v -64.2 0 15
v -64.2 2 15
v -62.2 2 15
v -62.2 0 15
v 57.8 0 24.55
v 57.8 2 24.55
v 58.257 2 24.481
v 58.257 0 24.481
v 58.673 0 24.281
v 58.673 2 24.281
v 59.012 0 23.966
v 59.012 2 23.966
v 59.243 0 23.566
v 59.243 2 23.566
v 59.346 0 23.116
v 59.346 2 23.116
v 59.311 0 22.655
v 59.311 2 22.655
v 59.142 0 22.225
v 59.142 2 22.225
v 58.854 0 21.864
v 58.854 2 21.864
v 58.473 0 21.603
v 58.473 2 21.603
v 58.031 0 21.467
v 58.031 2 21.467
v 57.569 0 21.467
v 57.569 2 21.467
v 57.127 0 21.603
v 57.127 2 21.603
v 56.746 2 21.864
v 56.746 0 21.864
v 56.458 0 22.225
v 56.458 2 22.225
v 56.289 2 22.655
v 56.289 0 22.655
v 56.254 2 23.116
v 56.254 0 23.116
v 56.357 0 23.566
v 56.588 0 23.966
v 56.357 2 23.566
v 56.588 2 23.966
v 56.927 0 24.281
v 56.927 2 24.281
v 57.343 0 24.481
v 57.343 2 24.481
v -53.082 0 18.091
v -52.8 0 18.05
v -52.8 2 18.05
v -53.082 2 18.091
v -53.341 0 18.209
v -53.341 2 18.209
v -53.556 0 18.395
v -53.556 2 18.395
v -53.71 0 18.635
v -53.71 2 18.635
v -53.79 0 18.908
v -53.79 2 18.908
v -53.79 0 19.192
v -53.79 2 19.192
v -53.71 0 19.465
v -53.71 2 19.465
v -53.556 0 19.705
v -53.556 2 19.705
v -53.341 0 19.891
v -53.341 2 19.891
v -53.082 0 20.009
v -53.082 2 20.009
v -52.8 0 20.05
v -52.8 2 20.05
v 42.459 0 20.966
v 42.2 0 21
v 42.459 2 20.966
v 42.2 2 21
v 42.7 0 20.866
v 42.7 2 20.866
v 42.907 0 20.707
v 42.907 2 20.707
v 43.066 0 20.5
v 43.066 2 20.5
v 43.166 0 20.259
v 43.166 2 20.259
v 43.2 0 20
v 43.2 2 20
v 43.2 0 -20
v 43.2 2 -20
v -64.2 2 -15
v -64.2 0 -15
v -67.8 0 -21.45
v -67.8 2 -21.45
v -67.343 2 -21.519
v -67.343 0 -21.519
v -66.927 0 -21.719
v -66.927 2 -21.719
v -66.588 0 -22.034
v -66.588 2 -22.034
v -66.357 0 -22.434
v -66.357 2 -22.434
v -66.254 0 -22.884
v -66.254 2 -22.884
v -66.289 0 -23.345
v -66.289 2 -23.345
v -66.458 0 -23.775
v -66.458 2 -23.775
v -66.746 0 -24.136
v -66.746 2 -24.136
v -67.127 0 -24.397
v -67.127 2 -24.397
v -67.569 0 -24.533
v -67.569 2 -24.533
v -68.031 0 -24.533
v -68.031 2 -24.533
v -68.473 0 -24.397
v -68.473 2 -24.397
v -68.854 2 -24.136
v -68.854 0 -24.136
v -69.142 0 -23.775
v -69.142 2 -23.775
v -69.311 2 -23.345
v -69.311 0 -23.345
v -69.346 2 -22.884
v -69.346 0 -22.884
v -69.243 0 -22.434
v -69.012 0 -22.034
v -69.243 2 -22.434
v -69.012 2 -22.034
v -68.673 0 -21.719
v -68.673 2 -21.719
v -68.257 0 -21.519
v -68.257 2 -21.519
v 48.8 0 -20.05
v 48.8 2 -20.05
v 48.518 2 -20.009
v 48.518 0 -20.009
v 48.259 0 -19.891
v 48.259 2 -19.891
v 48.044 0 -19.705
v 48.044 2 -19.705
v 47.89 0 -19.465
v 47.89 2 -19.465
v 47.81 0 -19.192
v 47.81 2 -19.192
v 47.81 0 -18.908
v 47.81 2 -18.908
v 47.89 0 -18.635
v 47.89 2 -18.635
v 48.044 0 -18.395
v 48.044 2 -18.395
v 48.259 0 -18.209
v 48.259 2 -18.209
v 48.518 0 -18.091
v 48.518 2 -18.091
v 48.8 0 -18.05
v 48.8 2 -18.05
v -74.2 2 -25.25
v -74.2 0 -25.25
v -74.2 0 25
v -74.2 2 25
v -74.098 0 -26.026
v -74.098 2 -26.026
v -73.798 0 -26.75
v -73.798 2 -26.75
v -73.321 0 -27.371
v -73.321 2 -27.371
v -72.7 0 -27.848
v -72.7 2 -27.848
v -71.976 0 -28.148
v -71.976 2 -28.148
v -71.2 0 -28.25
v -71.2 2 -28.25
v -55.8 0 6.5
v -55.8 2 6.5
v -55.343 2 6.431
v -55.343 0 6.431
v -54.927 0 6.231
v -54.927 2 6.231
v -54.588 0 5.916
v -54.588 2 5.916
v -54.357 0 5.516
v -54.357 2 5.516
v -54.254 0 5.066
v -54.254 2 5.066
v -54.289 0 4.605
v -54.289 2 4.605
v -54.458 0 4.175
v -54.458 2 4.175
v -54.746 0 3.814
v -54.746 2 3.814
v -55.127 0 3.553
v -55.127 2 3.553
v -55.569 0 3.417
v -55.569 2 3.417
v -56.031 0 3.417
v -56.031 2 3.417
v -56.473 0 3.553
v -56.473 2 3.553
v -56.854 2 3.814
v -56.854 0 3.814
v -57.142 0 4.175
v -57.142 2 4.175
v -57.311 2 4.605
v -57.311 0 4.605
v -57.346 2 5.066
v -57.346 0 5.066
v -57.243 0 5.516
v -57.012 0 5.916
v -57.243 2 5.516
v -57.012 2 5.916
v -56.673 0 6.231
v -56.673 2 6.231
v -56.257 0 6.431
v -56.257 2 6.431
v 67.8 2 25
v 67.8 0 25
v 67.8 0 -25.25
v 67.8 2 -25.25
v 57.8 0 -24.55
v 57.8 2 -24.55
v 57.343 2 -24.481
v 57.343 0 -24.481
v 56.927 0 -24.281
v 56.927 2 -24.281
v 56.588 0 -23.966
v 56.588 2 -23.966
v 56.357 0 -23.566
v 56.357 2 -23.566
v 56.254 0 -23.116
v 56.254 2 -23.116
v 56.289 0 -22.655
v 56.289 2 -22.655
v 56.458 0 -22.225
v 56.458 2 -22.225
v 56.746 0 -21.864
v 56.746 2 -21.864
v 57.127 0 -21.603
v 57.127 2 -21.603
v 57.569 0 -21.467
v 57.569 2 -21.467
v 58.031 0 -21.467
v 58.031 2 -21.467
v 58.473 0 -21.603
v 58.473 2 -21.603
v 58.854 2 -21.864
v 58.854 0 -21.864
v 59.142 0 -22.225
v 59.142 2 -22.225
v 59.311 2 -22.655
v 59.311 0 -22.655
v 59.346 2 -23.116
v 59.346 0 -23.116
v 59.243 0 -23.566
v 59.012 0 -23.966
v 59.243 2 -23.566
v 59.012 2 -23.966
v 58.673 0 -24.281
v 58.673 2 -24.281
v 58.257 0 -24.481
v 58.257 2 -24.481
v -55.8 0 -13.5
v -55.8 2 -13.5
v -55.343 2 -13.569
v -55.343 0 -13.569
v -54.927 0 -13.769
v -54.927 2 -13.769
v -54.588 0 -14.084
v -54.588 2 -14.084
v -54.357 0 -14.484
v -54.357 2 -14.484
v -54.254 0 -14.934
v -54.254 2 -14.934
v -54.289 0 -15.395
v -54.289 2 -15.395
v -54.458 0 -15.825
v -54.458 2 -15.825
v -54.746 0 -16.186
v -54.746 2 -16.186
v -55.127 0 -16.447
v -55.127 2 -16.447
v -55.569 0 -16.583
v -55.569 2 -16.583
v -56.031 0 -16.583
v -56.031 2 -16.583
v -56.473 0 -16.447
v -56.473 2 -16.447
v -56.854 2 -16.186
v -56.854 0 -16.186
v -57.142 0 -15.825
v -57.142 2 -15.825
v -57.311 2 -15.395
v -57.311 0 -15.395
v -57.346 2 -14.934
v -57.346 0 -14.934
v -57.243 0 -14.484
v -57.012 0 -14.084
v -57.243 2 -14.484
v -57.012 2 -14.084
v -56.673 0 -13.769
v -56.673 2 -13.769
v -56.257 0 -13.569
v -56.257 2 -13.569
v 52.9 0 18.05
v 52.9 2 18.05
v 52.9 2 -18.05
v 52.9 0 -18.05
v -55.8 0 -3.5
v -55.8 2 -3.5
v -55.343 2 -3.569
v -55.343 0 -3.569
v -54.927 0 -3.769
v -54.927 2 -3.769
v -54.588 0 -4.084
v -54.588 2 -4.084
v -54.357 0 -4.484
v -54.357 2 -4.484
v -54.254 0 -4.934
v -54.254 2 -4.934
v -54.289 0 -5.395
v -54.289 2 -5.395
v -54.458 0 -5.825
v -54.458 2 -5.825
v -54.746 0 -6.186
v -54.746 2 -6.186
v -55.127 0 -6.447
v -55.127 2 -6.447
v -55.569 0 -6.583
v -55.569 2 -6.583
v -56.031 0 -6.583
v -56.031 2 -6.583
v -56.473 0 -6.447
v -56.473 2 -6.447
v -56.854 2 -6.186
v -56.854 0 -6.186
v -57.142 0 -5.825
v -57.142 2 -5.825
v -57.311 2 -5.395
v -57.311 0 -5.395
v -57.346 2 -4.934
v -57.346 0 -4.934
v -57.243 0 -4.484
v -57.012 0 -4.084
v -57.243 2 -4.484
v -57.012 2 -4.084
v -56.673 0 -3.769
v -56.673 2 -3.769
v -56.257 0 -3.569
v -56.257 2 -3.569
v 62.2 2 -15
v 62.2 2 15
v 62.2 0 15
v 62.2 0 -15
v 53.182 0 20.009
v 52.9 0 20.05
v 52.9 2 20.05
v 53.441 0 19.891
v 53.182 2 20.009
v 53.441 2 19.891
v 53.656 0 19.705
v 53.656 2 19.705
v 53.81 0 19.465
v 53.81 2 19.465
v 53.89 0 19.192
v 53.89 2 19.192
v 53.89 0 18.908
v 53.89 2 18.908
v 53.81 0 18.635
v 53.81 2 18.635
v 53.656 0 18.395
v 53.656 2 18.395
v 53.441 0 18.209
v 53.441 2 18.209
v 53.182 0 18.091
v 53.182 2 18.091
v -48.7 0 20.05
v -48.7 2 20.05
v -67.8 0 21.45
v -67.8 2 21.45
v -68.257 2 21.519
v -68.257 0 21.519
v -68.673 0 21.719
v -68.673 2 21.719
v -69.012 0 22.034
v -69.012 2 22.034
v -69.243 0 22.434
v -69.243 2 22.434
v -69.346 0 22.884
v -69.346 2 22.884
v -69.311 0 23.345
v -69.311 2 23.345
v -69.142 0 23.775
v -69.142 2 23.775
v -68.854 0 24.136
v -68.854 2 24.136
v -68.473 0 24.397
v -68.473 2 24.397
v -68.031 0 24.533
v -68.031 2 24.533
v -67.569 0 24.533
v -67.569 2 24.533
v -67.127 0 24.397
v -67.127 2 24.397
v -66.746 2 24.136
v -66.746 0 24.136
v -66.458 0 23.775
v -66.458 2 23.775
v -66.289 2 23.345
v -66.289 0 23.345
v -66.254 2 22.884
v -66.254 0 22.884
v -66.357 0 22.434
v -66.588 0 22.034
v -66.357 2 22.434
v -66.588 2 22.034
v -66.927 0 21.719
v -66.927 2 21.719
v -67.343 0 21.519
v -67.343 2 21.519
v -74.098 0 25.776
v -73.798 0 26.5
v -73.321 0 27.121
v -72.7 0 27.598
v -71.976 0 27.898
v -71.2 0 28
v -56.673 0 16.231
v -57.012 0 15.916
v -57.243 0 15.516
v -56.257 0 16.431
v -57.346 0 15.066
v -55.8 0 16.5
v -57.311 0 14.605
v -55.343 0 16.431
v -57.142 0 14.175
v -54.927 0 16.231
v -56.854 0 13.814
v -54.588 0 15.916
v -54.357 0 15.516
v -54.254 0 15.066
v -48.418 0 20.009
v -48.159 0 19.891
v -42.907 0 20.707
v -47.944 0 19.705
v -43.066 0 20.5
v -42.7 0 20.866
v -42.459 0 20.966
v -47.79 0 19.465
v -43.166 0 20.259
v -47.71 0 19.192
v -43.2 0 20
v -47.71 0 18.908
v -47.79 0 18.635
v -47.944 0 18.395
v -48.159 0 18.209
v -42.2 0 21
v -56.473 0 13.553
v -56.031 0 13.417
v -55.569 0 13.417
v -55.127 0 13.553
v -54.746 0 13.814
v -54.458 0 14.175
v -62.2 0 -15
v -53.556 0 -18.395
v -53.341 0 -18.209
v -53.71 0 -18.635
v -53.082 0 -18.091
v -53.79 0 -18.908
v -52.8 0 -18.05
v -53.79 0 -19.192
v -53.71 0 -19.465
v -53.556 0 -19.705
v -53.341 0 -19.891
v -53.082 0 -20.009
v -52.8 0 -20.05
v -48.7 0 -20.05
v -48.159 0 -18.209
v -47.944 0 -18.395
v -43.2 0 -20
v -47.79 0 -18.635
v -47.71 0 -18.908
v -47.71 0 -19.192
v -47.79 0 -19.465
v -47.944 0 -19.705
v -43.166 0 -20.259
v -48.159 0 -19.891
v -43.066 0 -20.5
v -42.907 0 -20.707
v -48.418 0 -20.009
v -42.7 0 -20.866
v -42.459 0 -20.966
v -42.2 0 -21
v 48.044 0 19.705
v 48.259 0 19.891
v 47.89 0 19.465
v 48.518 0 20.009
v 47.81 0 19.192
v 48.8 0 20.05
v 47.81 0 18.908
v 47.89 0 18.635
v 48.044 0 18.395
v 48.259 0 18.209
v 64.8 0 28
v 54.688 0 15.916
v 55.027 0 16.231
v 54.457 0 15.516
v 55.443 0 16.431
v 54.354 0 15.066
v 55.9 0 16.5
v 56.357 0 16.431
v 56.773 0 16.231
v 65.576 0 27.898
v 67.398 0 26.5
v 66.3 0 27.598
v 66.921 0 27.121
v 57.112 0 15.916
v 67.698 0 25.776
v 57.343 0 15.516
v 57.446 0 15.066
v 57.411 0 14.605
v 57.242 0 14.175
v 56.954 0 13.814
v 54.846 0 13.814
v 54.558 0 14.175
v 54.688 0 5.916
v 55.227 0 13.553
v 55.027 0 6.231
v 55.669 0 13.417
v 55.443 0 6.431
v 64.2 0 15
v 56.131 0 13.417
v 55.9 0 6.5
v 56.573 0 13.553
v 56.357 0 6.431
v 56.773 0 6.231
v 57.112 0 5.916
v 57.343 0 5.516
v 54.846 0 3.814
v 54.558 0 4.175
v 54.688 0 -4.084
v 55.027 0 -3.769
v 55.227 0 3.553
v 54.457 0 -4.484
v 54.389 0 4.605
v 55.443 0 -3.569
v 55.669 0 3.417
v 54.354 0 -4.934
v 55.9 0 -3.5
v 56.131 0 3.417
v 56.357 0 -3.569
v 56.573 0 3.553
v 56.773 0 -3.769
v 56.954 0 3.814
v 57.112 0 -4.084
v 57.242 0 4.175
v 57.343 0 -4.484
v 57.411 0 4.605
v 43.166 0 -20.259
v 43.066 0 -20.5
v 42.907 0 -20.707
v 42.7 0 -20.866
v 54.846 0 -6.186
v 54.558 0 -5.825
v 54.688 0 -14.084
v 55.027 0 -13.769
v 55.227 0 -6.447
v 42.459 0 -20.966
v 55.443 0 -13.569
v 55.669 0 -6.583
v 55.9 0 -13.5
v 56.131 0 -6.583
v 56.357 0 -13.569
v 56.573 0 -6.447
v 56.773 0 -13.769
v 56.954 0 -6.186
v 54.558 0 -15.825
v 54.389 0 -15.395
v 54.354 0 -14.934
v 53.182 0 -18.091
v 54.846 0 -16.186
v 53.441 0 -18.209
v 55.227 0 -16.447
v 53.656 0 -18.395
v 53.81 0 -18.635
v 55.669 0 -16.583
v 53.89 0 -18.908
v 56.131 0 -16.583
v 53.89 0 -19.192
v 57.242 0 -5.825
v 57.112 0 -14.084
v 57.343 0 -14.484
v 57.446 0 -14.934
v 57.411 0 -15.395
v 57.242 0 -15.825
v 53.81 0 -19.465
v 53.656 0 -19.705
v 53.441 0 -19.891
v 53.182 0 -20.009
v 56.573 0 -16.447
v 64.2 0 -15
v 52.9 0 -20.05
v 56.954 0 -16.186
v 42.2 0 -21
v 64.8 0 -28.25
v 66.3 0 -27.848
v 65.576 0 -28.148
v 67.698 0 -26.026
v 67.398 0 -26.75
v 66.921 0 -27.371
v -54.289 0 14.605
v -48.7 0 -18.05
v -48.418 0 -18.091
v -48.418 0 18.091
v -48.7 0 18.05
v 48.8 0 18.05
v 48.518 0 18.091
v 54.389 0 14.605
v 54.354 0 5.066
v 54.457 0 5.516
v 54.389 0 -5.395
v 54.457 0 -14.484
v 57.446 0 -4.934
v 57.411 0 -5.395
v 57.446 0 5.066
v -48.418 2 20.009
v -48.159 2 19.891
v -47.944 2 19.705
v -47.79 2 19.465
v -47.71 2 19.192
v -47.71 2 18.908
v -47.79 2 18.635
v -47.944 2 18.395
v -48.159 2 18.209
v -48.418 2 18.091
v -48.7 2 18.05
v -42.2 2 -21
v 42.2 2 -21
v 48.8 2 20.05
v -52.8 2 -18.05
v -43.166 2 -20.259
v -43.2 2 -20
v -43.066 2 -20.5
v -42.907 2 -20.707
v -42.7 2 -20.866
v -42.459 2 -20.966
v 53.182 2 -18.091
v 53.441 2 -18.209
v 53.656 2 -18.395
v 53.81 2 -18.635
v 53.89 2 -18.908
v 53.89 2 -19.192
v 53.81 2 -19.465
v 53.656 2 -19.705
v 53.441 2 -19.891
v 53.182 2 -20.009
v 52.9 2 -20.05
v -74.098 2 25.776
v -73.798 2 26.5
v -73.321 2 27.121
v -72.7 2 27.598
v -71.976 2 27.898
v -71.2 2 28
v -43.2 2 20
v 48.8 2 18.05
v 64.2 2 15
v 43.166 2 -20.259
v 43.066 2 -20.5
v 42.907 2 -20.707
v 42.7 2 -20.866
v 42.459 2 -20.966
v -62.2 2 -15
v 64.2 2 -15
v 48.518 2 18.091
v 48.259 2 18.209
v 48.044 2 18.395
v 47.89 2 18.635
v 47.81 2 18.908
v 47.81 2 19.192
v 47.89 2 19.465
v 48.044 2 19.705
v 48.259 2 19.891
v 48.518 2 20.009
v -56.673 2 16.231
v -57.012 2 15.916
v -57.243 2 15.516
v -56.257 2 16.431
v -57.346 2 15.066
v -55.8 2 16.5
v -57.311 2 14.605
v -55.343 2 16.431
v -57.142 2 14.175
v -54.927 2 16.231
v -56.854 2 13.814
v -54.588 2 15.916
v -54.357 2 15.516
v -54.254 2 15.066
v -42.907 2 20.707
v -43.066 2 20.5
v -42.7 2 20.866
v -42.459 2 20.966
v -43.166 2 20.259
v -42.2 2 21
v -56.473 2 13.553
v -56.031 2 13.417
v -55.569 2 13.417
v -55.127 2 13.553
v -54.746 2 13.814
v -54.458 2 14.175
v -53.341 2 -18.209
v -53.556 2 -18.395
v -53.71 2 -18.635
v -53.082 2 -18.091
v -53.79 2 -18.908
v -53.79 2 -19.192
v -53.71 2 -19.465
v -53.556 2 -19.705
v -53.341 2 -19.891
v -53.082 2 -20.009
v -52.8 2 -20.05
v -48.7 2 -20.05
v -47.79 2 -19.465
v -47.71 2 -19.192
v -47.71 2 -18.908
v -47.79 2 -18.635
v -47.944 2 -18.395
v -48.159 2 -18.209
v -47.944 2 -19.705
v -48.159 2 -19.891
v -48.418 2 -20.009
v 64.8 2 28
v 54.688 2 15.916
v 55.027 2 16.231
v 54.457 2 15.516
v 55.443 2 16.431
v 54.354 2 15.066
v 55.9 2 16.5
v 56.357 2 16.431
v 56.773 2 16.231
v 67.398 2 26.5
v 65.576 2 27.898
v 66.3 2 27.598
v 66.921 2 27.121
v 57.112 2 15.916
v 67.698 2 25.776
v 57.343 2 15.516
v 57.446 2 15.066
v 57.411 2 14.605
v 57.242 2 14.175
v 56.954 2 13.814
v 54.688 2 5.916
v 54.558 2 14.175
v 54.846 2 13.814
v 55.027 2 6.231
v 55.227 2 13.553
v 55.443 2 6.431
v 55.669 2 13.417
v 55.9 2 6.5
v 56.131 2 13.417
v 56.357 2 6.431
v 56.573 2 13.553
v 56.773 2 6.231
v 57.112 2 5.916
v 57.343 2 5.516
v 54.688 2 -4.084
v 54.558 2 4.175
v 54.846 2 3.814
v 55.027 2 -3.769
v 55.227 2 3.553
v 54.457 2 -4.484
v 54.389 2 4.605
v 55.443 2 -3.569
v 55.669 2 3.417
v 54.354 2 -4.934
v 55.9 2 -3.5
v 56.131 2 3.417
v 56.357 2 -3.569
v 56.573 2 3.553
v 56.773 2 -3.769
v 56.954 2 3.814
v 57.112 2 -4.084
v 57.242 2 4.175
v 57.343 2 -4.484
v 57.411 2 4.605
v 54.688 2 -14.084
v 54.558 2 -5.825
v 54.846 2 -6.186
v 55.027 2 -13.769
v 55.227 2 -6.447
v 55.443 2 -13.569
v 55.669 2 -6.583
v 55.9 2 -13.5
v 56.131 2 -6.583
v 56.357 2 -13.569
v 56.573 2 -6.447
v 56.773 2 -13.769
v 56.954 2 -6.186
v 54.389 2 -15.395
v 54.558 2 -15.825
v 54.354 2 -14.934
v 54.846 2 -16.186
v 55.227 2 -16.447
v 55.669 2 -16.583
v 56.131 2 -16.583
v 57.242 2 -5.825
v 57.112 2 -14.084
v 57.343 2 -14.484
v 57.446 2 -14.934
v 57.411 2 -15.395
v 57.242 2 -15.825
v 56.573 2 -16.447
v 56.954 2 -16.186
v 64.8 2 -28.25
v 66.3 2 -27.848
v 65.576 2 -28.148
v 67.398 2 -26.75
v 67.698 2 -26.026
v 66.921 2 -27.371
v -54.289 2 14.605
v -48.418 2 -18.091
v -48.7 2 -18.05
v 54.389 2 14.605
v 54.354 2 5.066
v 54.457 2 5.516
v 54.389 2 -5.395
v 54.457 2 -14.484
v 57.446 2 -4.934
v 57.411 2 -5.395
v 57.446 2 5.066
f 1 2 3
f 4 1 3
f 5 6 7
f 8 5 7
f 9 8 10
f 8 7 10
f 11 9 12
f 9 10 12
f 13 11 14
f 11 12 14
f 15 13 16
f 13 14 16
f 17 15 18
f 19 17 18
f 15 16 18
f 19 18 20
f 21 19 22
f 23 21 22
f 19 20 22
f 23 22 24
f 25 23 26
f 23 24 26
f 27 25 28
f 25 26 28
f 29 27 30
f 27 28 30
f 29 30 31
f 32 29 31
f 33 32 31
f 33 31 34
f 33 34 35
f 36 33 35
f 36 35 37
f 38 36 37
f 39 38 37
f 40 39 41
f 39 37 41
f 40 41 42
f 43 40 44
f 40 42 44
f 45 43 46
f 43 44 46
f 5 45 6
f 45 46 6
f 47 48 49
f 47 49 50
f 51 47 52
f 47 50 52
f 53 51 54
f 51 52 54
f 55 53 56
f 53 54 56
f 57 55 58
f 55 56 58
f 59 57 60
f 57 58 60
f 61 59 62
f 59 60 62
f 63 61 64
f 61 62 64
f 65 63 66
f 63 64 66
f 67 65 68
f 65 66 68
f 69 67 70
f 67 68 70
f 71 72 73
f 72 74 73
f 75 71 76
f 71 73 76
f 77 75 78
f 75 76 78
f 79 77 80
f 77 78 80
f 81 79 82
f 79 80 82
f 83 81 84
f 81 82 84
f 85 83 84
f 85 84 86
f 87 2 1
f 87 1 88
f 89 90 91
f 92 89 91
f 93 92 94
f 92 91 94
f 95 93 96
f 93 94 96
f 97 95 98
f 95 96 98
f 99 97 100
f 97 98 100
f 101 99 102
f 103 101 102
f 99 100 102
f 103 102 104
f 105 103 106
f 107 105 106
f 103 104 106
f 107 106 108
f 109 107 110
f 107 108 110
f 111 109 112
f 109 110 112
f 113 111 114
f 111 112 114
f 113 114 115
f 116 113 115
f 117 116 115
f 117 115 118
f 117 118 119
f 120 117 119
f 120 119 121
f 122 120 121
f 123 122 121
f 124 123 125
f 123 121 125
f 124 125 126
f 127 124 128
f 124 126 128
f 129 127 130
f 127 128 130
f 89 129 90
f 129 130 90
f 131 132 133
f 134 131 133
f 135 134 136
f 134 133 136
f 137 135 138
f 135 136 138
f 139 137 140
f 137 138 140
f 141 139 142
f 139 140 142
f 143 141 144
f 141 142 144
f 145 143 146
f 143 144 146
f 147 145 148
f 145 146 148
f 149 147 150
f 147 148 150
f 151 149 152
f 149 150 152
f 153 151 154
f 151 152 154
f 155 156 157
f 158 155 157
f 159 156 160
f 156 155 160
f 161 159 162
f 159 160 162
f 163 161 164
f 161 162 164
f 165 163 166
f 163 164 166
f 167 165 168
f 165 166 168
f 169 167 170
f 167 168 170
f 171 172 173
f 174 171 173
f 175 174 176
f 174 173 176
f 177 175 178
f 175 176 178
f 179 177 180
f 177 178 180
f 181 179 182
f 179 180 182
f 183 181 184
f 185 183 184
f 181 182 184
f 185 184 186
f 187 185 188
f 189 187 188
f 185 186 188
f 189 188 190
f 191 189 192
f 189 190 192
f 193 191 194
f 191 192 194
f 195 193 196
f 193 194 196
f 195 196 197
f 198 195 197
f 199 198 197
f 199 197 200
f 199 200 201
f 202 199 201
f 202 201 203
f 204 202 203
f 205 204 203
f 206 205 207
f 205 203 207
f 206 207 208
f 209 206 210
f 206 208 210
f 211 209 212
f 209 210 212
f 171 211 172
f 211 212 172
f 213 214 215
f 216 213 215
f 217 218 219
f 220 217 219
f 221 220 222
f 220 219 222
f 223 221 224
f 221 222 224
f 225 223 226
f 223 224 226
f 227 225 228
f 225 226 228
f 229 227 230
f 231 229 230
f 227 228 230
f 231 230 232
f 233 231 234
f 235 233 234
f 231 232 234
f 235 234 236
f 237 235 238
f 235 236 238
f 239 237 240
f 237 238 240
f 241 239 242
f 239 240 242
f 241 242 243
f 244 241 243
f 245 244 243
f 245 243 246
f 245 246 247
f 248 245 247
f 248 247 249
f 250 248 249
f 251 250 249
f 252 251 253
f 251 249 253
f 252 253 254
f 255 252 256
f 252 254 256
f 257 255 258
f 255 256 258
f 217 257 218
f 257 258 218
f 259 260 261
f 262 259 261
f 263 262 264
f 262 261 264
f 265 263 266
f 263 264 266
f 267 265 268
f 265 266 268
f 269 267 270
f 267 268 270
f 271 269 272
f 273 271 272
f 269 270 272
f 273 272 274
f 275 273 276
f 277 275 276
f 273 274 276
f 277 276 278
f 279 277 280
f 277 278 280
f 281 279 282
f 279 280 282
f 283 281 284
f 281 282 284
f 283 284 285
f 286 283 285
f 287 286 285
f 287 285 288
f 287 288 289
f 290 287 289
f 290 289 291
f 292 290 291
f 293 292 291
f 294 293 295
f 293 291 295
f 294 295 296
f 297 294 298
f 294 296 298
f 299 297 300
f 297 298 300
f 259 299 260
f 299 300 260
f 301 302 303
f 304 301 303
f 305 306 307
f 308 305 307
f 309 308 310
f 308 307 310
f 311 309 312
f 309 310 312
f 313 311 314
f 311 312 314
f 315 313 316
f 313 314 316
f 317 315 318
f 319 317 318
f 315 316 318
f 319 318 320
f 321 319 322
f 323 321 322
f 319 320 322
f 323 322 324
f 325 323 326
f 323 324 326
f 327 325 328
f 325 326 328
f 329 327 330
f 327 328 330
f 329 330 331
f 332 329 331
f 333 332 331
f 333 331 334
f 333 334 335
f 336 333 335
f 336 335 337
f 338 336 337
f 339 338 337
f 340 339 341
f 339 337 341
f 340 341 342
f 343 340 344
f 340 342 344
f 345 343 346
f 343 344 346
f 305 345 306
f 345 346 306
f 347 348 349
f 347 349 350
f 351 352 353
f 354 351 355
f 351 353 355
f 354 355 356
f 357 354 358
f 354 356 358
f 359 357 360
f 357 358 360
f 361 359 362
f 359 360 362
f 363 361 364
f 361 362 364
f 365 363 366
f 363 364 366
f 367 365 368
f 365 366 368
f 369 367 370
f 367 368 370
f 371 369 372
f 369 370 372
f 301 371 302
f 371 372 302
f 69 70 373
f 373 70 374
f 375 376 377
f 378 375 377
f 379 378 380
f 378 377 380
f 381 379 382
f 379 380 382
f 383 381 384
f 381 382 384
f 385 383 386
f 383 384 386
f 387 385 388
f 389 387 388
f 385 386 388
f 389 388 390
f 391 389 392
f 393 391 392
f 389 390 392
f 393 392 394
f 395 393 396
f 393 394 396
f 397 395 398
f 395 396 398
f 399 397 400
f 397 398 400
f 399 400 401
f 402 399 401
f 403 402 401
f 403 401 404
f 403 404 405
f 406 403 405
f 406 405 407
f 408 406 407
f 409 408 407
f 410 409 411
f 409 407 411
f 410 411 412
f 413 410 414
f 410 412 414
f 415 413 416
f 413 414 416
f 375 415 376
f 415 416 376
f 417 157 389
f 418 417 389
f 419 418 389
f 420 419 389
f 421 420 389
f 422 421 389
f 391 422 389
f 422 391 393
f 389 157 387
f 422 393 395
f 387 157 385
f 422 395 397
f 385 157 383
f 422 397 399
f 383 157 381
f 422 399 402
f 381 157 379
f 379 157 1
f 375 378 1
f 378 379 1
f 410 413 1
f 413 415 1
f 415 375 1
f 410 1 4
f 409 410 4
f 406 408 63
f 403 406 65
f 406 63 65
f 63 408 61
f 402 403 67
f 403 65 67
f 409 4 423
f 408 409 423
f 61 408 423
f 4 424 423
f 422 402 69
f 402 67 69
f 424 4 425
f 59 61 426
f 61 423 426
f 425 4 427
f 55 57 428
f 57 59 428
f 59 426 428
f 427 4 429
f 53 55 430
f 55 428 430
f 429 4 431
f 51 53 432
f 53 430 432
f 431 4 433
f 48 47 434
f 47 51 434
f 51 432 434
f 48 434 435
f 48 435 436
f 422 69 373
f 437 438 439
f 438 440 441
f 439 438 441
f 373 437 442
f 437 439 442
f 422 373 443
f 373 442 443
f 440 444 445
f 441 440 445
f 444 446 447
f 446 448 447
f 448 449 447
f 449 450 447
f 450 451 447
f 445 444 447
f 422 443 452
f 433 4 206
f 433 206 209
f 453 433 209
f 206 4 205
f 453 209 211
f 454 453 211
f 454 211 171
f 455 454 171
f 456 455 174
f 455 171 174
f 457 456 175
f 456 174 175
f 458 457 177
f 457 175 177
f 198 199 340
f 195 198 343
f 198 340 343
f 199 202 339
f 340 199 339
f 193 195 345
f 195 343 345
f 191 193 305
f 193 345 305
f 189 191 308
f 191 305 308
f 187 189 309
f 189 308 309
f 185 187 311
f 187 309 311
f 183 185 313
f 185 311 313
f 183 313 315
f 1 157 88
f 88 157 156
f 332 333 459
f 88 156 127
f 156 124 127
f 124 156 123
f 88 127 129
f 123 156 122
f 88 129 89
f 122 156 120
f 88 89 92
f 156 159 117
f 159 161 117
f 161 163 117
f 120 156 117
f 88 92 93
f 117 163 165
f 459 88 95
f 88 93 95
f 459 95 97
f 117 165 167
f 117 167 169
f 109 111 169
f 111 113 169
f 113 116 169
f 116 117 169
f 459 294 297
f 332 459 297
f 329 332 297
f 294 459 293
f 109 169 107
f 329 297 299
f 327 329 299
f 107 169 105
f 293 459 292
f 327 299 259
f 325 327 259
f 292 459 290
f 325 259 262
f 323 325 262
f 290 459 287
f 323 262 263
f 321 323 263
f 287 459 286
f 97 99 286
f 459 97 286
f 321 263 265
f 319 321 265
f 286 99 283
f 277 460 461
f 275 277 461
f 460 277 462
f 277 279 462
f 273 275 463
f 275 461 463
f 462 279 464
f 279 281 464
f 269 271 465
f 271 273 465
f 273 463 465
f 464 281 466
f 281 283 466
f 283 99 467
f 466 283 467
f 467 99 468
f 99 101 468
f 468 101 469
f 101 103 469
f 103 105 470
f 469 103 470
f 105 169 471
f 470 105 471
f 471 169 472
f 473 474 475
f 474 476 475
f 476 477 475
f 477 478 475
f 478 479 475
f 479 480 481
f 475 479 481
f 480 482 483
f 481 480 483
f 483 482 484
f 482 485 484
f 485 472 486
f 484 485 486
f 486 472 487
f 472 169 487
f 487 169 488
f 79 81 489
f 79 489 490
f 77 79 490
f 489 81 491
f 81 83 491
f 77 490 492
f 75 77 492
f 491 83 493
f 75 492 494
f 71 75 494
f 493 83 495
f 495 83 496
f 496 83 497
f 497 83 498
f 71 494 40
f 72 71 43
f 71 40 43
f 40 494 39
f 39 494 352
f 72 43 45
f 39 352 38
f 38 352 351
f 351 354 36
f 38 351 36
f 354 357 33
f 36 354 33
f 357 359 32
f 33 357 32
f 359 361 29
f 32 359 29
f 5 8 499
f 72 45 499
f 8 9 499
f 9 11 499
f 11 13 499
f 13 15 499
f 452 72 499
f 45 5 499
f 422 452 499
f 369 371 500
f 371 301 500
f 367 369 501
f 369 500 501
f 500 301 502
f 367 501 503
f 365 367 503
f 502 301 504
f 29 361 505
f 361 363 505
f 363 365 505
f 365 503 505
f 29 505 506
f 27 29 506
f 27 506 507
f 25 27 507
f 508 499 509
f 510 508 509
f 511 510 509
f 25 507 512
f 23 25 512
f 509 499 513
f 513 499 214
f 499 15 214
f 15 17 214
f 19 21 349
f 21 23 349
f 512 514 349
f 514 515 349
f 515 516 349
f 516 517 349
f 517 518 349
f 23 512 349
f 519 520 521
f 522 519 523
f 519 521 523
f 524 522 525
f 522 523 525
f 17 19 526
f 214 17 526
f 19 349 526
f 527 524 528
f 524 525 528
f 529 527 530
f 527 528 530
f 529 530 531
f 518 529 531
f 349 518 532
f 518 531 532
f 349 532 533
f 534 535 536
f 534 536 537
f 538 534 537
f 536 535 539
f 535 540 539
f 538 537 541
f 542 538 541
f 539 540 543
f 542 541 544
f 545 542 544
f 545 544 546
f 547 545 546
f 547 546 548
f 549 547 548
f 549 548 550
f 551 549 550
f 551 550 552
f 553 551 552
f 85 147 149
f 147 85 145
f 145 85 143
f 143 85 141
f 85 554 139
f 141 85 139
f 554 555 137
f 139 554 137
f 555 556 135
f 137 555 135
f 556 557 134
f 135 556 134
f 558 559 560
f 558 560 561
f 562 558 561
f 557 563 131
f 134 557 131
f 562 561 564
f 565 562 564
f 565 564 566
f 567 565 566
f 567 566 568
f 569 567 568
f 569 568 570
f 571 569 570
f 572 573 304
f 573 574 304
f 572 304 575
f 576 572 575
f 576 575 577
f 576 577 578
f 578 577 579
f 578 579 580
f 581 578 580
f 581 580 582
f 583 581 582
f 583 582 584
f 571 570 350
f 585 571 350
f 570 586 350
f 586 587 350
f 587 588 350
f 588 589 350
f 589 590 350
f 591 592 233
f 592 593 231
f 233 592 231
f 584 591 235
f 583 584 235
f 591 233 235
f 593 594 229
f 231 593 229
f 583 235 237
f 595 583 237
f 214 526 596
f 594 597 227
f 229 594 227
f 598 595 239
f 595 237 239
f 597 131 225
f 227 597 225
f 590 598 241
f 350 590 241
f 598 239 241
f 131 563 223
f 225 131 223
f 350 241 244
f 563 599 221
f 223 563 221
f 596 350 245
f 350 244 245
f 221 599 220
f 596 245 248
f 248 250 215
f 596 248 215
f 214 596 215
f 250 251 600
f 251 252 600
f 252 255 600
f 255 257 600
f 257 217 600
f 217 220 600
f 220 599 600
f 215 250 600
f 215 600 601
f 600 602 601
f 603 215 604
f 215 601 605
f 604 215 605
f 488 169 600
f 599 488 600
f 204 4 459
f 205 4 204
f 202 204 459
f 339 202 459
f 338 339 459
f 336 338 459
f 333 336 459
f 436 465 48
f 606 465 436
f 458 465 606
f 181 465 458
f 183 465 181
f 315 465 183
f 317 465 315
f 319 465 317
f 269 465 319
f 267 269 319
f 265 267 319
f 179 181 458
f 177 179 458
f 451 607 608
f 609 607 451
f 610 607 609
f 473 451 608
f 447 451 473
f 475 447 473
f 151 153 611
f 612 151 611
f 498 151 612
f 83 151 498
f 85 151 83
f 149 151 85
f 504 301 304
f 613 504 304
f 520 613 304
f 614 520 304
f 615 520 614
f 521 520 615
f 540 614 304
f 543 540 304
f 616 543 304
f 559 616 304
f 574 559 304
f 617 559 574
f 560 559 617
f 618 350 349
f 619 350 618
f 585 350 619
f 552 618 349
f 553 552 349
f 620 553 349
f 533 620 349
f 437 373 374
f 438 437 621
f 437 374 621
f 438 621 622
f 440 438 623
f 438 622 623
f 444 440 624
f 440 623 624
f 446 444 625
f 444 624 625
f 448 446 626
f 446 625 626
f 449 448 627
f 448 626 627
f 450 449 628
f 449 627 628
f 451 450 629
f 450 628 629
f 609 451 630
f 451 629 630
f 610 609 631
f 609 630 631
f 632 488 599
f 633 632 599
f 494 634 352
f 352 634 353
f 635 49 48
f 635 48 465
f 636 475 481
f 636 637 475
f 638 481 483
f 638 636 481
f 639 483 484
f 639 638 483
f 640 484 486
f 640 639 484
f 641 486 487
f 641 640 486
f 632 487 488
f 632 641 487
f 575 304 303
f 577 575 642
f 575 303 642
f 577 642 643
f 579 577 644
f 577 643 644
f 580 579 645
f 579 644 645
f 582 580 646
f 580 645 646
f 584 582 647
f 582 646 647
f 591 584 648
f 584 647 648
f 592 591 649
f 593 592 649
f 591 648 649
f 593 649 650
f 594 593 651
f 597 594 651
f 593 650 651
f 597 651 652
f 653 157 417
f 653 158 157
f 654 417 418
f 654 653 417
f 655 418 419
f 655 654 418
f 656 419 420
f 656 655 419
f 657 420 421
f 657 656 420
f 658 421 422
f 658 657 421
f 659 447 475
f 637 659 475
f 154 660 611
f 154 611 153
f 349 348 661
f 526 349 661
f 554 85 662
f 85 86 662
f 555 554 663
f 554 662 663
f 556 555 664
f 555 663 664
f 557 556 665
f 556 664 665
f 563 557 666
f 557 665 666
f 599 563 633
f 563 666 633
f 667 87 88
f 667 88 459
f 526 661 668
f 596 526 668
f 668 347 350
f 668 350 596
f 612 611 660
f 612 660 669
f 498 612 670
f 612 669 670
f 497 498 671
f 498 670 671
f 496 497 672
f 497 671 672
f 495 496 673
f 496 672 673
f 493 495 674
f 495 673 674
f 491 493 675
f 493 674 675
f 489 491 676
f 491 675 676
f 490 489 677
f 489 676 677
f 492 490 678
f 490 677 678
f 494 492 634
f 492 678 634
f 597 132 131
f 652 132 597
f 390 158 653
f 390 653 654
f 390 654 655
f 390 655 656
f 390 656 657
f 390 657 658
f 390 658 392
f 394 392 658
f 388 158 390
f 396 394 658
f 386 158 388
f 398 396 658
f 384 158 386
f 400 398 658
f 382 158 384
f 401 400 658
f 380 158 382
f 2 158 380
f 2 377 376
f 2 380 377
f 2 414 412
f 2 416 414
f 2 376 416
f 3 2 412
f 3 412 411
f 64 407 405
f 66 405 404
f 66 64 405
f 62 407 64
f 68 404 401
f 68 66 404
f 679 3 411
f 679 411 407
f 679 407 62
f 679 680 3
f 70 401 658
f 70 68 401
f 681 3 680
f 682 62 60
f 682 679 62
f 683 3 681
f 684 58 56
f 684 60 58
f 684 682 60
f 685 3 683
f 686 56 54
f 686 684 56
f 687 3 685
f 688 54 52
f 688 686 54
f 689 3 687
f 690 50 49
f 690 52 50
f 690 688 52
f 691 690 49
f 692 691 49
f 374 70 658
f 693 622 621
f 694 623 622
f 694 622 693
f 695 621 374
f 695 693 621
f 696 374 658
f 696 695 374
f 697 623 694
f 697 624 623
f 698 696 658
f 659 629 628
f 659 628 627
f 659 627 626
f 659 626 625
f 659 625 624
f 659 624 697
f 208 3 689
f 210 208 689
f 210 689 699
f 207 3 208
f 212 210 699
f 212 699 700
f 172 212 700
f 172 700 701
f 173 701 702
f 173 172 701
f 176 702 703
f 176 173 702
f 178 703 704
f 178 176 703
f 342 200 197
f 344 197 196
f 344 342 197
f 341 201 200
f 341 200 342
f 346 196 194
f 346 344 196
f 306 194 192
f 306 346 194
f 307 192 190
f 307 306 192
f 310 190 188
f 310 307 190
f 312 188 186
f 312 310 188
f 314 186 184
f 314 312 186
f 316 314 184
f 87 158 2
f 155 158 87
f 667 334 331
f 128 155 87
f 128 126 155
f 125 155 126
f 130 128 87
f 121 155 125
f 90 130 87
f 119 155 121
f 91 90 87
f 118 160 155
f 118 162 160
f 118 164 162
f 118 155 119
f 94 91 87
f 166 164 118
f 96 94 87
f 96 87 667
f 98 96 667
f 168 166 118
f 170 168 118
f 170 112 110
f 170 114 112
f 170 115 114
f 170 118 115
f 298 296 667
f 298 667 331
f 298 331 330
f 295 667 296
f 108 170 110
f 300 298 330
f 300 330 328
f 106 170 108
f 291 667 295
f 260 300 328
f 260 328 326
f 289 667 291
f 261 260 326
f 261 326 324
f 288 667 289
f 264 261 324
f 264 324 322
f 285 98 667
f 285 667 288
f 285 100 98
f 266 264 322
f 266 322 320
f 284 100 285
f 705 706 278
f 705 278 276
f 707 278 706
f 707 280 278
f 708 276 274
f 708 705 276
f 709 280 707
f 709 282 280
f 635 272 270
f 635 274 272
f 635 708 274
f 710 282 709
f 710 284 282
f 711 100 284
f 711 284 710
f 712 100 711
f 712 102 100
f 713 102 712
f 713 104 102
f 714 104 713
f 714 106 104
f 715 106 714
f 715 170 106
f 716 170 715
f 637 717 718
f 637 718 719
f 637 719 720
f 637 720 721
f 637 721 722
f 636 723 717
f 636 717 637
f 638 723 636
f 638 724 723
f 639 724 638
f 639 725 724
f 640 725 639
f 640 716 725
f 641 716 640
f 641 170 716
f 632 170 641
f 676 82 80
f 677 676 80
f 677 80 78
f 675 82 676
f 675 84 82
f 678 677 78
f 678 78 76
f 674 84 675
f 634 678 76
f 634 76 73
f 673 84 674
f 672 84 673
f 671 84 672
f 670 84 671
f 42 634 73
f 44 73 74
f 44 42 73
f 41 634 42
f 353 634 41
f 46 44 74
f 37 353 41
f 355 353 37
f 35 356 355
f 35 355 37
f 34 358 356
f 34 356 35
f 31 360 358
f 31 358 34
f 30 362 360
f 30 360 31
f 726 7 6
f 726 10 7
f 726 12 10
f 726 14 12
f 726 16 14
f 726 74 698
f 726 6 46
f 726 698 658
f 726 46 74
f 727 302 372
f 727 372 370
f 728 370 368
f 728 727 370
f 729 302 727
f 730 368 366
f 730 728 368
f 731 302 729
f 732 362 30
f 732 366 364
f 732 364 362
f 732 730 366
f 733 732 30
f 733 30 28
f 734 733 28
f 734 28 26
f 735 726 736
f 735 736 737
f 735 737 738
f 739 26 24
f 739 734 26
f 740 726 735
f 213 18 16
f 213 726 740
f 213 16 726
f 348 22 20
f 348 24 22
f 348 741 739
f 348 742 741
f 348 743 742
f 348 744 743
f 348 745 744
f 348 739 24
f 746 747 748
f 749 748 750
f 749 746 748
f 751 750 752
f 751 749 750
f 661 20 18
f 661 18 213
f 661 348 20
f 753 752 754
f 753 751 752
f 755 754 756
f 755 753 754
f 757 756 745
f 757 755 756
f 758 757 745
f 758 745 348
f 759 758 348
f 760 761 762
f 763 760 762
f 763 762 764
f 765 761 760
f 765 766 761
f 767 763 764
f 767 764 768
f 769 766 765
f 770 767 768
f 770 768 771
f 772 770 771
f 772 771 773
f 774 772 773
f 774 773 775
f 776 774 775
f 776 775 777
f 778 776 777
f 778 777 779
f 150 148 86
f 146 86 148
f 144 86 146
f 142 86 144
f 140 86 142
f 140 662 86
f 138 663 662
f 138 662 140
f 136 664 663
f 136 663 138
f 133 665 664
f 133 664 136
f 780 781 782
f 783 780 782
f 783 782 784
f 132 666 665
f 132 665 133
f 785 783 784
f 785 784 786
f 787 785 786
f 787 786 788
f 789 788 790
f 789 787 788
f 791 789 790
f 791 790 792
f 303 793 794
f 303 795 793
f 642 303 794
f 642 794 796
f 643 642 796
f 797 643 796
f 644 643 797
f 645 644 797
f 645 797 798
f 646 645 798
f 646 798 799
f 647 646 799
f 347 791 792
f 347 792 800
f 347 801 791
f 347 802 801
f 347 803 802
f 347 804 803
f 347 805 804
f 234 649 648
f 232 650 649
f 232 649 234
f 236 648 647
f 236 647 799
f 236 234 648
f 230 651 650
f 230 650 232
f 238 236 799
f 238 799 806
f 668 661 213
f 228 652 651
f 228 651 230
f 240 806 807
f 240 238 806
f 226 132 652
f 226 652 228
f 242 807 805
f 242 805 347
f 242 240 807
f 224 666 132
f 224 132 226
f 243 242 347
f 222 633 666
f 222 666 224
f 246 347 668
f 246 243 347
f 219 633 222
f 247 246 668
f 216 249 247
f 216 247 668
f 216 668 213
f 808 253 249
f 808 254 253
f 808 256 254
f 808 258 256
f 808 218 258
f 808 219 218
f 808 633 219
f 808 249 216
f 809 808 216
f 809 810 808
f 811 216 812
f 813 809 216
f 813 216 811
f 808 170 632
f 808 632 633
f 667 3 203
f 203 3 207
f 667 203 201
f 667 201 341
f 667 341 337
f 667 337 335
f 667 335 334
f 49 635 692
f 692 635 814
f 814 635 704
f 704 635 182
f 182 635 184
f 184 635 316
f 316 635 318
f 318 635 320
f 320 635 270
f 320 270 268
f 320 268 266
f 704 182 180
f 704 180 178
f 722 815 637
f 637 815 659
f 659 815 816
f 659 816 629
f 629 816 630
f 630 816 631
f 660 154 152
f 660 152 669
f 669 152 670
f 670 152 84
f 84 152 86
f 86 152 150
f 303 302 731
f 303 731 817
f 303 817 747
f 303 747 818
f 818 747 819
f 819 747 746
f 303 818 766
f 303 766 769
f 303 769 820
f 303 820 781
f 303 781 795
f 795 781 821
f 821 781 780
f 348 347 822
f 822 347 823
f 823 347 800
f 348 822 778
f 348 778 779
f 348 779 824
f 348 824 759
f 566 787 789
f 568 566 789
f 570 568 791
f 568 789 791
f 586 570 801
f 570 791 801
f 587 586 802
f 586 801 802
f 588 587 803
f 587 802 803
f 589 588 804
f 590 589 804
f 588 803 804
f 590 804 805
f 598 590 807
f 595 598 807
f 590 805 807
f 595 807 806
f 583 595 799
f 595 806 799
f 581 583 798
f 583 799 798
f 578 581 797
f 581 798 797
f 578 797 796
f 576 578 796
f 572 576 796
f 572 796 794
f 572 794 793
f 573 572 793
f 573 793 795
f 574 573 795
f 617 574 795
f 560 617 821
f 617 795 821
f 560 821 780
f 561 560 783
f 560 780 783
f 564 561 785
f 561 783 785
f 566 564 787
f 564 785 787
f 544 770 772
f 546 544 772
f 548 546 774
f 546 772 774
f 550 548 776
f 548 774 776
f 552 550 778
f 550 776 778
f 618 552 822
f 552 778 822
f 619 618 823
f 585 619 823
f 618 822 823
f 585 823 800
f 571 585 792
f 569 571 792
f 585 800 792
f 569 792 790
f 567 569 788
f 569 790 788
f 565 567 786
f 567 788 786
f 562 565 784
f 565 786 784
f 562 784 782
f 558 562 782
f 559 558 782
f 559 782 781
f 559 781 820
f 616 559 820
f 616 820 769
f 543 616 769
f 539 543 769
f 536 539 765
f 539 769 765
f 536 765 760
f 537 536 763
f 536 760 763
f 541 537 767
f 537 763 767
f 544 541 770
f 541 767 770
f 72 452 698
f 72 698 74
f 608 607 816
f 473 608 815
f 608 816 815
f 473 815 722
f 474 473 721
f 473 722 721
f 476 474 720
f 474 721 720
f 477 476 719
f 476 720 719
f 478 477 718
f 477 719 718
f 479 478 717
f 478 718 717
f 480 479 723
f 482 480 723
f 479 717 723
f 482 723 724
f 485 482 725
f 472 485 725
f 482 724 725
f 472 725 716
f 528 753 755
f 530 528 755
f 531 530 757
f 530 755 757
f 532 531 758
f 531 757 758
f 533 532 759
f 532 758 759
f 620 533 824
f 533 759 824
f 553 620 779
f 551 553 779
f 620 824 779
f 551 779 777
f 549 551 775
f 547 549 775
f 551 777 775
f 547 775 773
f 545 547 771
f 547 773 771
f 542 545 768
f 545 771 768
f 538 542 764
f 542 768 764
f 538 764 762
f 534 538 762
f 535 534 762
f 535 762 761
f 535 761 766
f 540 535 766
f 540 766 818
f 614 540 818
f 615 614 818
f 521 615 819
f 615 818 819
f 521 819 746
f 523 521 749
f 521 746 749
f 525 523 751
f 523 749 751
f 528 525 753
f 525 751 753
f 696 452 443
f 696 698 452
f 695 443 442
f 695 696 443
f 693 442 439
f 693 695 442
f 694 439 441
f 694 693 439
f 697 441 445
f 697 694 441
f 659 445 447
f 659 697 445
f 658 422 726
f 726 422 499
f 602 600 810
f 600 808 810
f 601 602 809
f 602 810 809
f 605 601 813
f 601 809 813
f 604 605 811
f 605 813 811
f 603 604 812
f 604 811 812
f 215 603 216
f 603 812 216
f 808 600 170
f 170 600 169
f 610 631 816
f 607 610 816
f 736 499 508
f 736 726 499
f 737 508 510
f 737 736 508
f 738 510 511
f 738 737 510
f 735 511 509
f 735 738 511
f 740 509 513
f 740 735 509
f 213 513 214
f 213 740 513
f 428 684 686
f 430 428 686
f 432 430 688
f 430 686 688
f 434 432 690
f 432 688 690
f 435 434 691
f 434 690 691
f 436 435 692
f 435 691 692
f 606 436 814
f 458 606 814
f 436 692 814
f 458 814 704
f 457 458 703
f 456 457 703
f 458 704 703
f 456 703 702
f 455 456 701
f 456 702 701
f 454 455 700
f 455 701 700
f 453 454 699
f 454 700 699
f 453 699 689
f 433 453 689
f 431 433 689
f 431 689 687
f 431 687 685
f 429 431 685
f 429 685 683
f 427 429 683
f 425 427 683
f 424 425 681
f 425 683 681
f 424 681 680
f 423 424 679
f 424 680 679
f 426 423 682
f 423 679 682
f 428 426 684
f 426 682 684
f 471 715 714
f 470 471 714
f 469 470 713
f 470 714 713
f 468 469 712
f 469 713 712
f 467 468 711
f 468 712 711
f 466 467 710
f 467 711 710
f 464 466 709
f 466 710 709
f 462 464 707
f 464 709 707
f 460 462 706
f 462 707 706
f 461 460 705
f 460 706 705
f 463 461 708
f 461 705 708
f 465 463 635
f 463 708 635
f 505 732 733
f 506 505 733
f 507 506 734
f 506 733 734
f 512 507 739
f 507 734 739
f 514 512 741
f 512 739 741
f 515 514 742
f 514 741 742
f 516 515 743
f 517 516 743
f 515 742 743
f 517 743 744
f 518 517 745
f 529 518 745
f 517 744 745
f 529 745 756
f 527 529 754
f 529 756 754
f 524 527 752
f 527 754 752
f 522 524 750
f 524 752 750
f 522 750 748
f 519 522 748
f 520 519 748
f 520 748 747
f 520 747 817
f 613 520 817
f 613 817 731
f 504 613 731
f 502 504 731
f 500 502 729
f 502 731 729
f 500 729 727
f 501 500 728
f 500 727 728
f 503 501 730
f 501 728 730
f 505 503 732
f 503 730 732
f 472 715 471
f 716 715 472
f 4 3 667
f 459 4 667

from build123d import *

# Parameters (mm, degrees)
SKETCH_1_W          = 86.4
SKETCH_1_H          = 42
EXTRUDE_1_DEPTH     = 2
SKETCH_2_W          = 4.1
SKETCH_2_H          = 40.1
CUT_EXTRUDE_1_DEPTH = 2
SKETCH_4_R          = 1
CUT_EXTRUDE_2_DEPTH = 2
SKETCH_5_R          = 1.55
CUT_EXTRUDE_3_DEPTH = 2
SKETCH_6_R          = 1.55
CUT_EXTRUDE_4_DEPTH = 2
SKETCH_7_W          = 2
SKETCH_7_H          = 30
CUT_EXTRUDE_5_DEPTH = 2
FILLET_1_R          = 1
FILLET_2_R          = 3


with BuildPart() as part:
    # 草图1 → 凸台-拉伸1 (new body)
    with BuildSketch(Plane(origin=(0, 0, 0), x_dir=(1, 0, 0), z_dir=(0, 1, 0))):
        Polygon((-67.2, 28.25), (-74.2, 28.25), (-74.2, -28), (-67.2, -28), (67.8, -28), (67.8, 28.25), align=None)
        Rectangle(SKETCH_1_W, SKETCH_1_H, mode=Mode.SUBTRACT)
    extrude(amount=EXTRUDE_1_DEPTH)

    # 草图2 → 切除-拉伸1 (cut)
    with BuildSketch(Plane(origin=(0, 2, 0), x_dir=(1, 0, 0), z_dir=(0, 1, 0))):
        with Locations((-50.75, 0)):
            Rectangle(SKETCH_2_W, SKETCH_2_H)
        with Locations((50.85, 0)):
            Rectangle(SKETCH_2_W, SKETCH_2_H)
    extrude(amount=-CUT_EXTRUDE_1_DEPTH, mode=Mode.SUBTRACT)

    # 草图4 → 切除-拉伸2 (cut)
    with BuildSketch(Plane(origin=(0, 2, 0), x_dir=(1, 0, 0), z_dir=(0, 1, 0))):
        with Locations((-52.8, 19.05)):
            Circle(SKETCH_4_R)
        with Locations((-48.7, 19.05)):
            Circle(SKETCH_4_R)
        with Locations((-52.8, -19.05)):
            Circle(SKETCH_4_R)
        with Locations((-48.7, -19.05)):
            Circle(SKETCH_4_R)
        with Locations((48.8, -19.05)):
            Circle(SKETCH_4_R)
        with Locations((52.9, -19.05)):
            Circle(SKETCH_4_R)
        with Locations((52.9, 19.05)):
            Circle(SKETCH_4_R)
        with Locations((48.8, 19.05)):
            Circle(SKETCH_4_R)
    extrude(amount=-CUT_EXTRUDE_2_DEPTH, mode=Mode.SUBTRACT)

    # 草图5 → 切除-拉伸3 (cut)
    with BuildSketch(Plane(origin=(0, 2, 0), x_dir=(1, 0, 0), z_dir=(0, 1, 0))):
        with Locations(Location((55.9, 15.05, 0), (0, 0, 270))):
            Circle(SKETCH_5_R)
        with Locations(Location((55.9, 5.05, 0), (0, 0, 270))):
            Circle(SKETCH_5_R)
        with Locations(Location((55.9, -4.95, 0), (0, 0, 270))):
            Circle(SKETCH_5_R)
        with Locations(Location((55.9, -14.95, 0), (0, 0, 270))):
            Circle(SKETCH_5_R)
        with Locations(Location((-55.8, 15.05, 0), (0, 0, 270))):
            Circle(SKETCH_5_R)
        with Locations(Location((-55.8, 5.05, 0), (0, 0, 270))):
            Circle(SKETCH_5_R)
        with Locations(Location((-55.8, -4.95, 0), (0, 0, 270))):
            Circle(SKETCH_5_R)
        with Locations(Location((-55.8, -14.95, 0), (0, 0, 270))):
            Circle(SKETCH_5_R)
    extrude(amount=-CUT_EXTRUDE_3_DEPTH, mode=Mode.SUBTRACT)

    # 草图6 → 切除-拉伸4 (cut)
    with BuildSketch(Plane(origin=(0, 2, 0), x_dir=(1, 0, 0), z_dir=(0, 1, 0))):
        with Locations(Location((57.8, -23, 0), (0, 0, 270))):
            Circle(SKETCH_6_R)
        with Locations(Location((57.8, 23, 0), (0, 0, 90))):
            Circle(SKETCH_6_R)
        with Locations(Location((-67.8, -23, 0), (0, 0, 90))):
            Circle(SKETCH_6_R)
        with Locations(Location((-67.8, 23, 0), (0, 0, 270))):
            Circle(SKETCH_6_R)
    extrude(amount=-CUT_EXTRUDE_4_DEPTH, mode=Mode.SUBTRACT)

    # 草图7 → 切除-拉伸5 (cut)
    with BuildSketch(Plane(origin=(0, 2, 0), x_dir=(1, 0, 0), z_dir=(0, 1, 0))):
        with Locations((-63.2, 0)):
            Rectangle(SKETCH_7_W, SKETCH_7_H)
        with Locations((63.2, 0)):
            Rectangle(SKETCH_7_W, SKETCH_7_H)
    extrude(amount=-CUT_EXTRUDE_5_DEPTH, mode=Mode.SUBTRACT)

    # 圆角1
    fillet_1_edges = [part.edges().sort_by_distance(p)[0] for p in [
        (43.2, 1, 21),
        (43.2, 1, -21),
        (-43.2, 1, -21),
        (-43.2, 1, 21),
    ]]
    fillet(fillet_1_edges, radius=FILLET_1_R)

    # 圆角2
    fillet_2_edges = [part.edges().sort_by_distance(p)[0] for p in [
        (67.8, 1, 28),
        (-74.2, 1, 28),
        (-74.2, 1, -28.25),
        (67.8, 1, -28.25),
    ]]
    fillet(fillet_2_edges, radius=FILLET_2_R)


solid = part.part
